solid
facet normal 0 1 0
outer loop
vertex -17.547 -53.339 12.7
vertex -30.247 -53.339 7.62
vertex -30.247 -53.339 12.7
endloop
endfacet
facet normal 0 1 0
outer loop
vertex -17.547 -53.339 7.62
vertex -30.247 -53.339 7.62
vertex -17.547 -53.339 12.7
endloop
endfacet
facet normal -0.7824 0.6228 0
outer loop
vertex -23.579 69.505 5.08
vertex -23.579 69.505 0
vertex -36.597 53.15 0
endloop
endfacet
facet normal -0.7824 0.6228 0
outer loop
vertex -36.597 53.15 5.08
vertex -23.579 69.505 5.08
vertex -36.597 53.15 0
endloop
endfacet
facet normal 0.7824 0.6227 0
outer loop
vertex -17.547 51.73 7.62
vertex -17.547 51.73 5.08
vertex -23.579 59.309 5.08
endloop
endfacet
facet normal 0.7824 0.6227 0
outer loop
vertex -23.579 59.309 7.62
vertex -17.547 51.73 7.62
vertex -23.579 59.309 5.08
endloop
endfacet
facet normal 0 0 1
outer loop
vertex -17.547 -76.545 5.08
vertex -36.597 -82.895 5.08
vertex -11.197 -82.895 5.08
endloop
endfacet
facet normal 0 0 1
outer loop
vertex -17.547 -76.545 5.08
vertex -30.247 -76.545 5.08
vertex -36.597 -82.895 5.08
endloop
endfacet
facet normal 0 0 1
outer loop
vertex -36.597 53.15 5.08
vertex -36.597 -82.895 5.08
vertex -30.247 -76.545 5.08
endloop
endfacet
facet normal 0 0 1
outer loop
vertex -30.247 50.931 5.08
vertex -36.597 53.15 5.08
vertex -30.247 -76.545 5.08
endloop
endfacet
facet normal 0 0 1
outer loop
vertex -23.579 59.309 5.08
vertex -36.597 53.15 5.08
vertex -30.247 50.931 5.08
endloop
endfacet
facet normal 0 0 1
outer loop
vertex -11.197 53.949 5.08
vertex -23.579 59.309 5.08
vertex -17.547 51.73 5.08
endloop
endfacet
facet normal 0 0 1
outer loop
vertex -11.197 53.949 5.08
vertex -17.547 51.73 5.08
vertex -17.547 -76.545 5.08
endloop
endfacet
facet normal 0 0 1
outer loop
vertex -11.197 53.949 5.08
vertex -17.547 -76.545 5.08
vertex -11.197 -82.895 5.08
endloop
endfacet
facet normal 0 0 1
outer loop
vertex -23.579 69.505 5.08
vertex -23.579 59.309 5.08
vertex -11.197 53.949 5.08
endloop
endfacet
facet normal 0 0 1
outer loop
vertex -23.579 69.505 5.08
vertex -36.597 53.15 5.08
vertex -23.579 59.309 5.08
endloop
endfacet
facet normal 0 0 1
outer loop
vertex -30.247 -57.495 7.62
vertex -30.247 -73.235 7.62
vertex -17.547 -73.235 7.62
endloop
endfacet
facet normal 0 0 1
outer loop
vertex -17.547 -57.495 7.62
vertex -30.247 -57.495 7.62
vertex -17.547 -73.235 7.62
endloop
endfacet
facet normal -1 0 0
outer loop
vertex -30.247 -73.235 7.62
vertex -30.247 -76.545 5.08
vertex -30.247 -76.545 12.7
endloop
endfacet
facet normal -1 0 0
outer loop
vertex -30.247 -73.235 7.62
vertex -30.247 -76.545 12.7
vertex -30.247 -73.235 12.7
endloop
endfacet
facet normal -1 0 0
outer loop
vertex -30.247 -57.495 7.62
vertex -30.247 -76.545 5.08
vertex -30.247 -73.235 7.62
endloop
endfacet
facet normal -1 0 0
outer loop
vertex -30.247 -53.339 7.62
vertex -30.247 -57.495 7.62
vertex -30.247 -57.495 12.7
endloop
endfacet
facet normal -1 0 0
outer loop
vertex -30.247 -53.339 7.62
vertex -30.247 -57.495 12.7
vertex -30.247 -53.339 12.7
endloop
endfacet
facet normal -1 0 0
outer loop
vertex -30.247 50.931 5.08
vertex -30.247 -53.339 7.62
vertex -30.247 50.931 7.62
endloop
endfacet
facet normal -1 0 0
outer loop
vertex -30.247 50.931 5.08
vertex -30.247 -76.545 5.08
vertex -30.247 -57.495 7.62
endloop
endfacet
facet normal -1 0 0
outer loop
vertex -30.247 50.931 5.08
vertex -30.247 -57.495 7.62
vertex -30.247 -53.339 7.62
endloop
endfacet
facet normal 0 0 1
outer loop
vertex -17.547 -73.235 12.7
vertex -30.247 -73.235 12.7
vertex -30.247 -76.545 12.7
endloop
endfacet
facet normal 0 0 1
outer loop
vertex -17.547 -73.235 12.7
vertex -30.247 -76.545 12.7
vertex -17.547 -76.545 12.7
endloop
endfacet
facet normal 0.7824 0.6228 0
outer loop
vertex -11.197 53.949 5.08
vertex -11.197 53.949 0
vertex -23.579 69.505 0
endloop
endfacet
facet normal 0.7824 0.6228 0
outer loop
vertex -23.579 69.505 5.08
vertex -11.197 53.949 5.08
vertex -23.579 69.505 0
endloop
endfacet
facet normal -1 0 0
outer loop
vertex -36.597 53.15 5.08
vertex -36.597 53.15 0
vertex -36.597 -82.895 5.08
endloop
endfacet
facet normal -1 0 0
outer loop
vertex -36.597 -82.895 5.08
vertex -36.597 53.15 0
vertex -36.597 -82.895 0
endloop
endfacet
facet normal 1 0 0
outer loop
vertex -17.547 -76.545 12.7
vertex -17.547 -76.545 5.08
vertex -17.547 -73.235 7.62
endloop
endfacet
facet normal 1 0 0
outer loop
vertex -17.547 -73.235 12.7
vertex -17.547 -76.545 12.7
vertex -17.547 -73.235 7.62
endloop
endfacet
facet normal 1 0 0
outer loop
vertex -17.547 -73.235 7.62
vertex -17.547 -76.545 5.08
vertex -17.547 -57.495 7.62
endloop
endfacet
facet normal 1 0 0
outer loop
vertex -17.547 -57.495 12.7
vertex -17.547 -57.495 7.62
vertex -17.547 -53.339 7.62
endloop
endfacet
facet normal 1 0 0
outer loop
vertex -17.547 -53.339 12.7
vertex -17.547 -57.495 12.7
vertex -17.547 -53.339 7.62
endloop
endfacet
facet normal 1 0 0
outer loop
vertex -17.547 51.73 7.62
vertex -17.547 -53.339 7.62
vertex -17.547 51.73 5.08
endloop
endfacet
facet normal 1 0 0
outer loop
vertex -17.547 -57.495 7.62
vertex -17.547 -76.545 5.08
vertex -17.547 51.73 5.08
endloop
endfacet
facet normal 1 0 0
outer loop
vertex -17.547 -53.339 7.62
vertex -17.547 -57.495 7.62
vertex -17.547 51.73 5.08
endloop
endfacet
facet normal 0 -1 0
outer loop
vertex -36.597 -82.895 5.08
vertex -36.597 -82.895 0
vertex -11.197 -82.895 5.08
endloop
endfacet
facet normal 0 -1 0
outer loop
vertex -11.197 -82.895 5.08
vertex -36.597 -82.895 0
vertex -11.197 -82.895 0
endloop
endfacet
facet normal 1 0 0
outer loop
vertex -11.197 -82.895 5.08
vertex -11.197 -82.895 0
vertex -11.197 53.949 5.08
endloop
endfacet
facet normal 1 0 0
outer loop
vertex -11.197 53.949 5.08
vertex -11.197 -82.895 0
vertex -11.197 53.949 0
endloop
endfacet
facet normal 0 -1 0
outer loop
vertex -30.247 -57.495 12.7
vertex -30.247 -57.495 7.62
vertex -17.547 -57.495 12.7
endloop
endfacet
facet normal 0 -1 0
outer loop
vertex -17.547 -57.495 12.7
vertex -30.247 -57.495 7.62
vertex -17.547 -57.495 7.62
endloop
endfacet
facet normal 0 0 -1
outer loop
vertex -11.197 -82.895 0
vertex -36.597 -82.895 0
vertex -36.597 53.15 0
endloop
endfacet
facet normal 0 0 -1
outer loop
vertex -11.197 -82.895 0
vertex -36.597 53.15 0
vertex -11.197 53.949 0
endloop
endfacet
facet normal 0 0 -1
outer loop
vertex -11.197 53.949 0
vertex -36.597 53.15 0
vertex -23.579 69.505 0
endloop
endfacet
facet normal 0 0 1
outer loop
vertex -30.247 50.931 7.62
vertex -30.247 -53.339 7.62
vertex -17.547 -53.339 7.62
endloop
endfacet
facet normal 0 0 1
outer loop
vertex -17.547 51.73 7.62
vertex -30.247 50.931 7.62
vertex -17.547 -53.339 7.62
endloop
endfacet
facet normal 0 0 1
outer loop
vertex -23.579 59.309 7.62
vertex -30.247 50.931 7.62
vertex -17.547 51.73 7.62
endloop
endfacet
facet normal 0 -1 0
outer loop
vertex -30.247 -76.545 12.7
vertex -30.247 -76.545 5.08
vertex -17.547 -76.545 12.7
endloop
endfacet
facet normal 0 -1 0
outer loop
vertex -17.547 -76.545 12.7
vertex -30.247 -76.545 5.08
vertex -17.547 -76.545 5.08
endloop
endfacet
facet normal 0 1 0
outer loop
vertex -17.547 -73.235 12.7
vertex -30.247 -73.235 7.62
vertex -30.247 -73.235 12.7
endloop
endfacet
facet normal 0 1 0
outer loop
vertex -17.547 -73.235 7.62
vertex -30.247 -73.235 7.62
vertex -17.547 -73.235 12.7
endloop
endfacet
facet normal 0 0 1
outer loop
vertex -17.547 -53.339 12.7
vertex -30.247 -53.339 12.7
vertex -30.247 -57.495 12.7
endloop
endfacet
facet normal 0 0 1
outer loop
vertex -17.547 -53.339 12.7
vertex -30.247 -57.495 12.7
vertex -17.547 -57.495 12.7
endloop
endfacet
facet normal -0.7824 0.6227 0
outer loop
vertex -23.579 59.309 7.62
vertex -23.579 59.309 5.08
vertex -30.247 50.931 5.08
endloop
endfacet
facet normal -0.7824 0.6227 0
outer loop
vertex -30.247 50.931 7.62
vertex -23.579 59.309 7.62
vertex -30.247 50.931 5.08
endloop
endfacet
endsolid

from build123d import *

# Parameters (mm, degrees)
F0_W     = 25.4
F0_H     = 3.4750678155
F1_DEPTH = 5.08
F0_W_2   = 12.7
F0_H_2   = 15.7407342222
F2_DEPTH = 7.62
F0_H_3   = 4.1556985352
F0_H_4   = 3.3092657778
F3_DEPTH = 12.7


with BuildPart() as f1:
    # F0 (on Top) → F1 (new body)
    with BuildSketch(Plane.XY):
        Polygon((-36.596847949, 53.1499683857), (-36.596847949, -73.2352957129), (-30.246847949, -73.2352957129), (-30.246847949, -57.4945614907), (-30.246847949, -53.3388629556), (-30.246847949, -19.8709424585), (-30.246847949, -15.9986205399), (-30.246847949, 50.9313653009), (-23.5789932814, 59.3087746812), (-17.546847949, 51.7300625752), (-17.546847949, -15.9986205399), (-17.546847949, -19.8709424585), (-17.546847949, -53.3388629556), (-17.546847949, -57.4945614907), (-17.546847949, -73.2352957129), (-11.196847949, -73.2352957129), (-11.196847949, 53.94866566), (-23.5789932814, 69.5054385093), align=None)
        Polygon((-36.596847949, -73.2352957129), (-36.596847949, -79.4194936752), (-11.196847949, -79.4194936752), (-11.196847949, -73.2352957129), (-17.546847949, -73.2352957129), (-17.546847949, -76.5445614907), (-30.246847949, -76.5445614907), (-30.246847949, -73.2352957129), align=None)
        with Locations((-23.896847949, -81.157027583)):
            Rectangle(F0_W, F0_H)
    extrude(amount=F1_DEPTH)

    # F0 (on Top) → F2 (join)
    with BuildSketch(Plane.XY):
        with Locations((-23.896847949, -65.3649286018)):
            Rectangle(F0_W_2, F0_H_2)
        Polygon((-30.246847949, -19.8709424585), (-30.246847949, -53.3388629556), (-17.546847949, -53.3388629556), (-17.546847949, -19.8709424585), (-17.546847949, -15.9986205399), (-17.546847949, 51.7300625752), (-23.5789932814, 59.3087746812), (-30.246847949, 50.9313653009), (-30.246847949, -15.9986205399), align=None)
    extrude(amount=F2_DEPTH)

    # F0 (on Top) → F3 (join)
    with BuildSketch(Plane.XY):
        with Locations((-23.896847949, -55.4167122231)):
            Rectangle(F0_W_2, F0_H_3)
        with Locations((-23.896847949, -74.8899286018)):
            Rectangle(F0_W_2, F0_H_4)
    extrude(amount=F3_DEPTH)


solid = f1.part
